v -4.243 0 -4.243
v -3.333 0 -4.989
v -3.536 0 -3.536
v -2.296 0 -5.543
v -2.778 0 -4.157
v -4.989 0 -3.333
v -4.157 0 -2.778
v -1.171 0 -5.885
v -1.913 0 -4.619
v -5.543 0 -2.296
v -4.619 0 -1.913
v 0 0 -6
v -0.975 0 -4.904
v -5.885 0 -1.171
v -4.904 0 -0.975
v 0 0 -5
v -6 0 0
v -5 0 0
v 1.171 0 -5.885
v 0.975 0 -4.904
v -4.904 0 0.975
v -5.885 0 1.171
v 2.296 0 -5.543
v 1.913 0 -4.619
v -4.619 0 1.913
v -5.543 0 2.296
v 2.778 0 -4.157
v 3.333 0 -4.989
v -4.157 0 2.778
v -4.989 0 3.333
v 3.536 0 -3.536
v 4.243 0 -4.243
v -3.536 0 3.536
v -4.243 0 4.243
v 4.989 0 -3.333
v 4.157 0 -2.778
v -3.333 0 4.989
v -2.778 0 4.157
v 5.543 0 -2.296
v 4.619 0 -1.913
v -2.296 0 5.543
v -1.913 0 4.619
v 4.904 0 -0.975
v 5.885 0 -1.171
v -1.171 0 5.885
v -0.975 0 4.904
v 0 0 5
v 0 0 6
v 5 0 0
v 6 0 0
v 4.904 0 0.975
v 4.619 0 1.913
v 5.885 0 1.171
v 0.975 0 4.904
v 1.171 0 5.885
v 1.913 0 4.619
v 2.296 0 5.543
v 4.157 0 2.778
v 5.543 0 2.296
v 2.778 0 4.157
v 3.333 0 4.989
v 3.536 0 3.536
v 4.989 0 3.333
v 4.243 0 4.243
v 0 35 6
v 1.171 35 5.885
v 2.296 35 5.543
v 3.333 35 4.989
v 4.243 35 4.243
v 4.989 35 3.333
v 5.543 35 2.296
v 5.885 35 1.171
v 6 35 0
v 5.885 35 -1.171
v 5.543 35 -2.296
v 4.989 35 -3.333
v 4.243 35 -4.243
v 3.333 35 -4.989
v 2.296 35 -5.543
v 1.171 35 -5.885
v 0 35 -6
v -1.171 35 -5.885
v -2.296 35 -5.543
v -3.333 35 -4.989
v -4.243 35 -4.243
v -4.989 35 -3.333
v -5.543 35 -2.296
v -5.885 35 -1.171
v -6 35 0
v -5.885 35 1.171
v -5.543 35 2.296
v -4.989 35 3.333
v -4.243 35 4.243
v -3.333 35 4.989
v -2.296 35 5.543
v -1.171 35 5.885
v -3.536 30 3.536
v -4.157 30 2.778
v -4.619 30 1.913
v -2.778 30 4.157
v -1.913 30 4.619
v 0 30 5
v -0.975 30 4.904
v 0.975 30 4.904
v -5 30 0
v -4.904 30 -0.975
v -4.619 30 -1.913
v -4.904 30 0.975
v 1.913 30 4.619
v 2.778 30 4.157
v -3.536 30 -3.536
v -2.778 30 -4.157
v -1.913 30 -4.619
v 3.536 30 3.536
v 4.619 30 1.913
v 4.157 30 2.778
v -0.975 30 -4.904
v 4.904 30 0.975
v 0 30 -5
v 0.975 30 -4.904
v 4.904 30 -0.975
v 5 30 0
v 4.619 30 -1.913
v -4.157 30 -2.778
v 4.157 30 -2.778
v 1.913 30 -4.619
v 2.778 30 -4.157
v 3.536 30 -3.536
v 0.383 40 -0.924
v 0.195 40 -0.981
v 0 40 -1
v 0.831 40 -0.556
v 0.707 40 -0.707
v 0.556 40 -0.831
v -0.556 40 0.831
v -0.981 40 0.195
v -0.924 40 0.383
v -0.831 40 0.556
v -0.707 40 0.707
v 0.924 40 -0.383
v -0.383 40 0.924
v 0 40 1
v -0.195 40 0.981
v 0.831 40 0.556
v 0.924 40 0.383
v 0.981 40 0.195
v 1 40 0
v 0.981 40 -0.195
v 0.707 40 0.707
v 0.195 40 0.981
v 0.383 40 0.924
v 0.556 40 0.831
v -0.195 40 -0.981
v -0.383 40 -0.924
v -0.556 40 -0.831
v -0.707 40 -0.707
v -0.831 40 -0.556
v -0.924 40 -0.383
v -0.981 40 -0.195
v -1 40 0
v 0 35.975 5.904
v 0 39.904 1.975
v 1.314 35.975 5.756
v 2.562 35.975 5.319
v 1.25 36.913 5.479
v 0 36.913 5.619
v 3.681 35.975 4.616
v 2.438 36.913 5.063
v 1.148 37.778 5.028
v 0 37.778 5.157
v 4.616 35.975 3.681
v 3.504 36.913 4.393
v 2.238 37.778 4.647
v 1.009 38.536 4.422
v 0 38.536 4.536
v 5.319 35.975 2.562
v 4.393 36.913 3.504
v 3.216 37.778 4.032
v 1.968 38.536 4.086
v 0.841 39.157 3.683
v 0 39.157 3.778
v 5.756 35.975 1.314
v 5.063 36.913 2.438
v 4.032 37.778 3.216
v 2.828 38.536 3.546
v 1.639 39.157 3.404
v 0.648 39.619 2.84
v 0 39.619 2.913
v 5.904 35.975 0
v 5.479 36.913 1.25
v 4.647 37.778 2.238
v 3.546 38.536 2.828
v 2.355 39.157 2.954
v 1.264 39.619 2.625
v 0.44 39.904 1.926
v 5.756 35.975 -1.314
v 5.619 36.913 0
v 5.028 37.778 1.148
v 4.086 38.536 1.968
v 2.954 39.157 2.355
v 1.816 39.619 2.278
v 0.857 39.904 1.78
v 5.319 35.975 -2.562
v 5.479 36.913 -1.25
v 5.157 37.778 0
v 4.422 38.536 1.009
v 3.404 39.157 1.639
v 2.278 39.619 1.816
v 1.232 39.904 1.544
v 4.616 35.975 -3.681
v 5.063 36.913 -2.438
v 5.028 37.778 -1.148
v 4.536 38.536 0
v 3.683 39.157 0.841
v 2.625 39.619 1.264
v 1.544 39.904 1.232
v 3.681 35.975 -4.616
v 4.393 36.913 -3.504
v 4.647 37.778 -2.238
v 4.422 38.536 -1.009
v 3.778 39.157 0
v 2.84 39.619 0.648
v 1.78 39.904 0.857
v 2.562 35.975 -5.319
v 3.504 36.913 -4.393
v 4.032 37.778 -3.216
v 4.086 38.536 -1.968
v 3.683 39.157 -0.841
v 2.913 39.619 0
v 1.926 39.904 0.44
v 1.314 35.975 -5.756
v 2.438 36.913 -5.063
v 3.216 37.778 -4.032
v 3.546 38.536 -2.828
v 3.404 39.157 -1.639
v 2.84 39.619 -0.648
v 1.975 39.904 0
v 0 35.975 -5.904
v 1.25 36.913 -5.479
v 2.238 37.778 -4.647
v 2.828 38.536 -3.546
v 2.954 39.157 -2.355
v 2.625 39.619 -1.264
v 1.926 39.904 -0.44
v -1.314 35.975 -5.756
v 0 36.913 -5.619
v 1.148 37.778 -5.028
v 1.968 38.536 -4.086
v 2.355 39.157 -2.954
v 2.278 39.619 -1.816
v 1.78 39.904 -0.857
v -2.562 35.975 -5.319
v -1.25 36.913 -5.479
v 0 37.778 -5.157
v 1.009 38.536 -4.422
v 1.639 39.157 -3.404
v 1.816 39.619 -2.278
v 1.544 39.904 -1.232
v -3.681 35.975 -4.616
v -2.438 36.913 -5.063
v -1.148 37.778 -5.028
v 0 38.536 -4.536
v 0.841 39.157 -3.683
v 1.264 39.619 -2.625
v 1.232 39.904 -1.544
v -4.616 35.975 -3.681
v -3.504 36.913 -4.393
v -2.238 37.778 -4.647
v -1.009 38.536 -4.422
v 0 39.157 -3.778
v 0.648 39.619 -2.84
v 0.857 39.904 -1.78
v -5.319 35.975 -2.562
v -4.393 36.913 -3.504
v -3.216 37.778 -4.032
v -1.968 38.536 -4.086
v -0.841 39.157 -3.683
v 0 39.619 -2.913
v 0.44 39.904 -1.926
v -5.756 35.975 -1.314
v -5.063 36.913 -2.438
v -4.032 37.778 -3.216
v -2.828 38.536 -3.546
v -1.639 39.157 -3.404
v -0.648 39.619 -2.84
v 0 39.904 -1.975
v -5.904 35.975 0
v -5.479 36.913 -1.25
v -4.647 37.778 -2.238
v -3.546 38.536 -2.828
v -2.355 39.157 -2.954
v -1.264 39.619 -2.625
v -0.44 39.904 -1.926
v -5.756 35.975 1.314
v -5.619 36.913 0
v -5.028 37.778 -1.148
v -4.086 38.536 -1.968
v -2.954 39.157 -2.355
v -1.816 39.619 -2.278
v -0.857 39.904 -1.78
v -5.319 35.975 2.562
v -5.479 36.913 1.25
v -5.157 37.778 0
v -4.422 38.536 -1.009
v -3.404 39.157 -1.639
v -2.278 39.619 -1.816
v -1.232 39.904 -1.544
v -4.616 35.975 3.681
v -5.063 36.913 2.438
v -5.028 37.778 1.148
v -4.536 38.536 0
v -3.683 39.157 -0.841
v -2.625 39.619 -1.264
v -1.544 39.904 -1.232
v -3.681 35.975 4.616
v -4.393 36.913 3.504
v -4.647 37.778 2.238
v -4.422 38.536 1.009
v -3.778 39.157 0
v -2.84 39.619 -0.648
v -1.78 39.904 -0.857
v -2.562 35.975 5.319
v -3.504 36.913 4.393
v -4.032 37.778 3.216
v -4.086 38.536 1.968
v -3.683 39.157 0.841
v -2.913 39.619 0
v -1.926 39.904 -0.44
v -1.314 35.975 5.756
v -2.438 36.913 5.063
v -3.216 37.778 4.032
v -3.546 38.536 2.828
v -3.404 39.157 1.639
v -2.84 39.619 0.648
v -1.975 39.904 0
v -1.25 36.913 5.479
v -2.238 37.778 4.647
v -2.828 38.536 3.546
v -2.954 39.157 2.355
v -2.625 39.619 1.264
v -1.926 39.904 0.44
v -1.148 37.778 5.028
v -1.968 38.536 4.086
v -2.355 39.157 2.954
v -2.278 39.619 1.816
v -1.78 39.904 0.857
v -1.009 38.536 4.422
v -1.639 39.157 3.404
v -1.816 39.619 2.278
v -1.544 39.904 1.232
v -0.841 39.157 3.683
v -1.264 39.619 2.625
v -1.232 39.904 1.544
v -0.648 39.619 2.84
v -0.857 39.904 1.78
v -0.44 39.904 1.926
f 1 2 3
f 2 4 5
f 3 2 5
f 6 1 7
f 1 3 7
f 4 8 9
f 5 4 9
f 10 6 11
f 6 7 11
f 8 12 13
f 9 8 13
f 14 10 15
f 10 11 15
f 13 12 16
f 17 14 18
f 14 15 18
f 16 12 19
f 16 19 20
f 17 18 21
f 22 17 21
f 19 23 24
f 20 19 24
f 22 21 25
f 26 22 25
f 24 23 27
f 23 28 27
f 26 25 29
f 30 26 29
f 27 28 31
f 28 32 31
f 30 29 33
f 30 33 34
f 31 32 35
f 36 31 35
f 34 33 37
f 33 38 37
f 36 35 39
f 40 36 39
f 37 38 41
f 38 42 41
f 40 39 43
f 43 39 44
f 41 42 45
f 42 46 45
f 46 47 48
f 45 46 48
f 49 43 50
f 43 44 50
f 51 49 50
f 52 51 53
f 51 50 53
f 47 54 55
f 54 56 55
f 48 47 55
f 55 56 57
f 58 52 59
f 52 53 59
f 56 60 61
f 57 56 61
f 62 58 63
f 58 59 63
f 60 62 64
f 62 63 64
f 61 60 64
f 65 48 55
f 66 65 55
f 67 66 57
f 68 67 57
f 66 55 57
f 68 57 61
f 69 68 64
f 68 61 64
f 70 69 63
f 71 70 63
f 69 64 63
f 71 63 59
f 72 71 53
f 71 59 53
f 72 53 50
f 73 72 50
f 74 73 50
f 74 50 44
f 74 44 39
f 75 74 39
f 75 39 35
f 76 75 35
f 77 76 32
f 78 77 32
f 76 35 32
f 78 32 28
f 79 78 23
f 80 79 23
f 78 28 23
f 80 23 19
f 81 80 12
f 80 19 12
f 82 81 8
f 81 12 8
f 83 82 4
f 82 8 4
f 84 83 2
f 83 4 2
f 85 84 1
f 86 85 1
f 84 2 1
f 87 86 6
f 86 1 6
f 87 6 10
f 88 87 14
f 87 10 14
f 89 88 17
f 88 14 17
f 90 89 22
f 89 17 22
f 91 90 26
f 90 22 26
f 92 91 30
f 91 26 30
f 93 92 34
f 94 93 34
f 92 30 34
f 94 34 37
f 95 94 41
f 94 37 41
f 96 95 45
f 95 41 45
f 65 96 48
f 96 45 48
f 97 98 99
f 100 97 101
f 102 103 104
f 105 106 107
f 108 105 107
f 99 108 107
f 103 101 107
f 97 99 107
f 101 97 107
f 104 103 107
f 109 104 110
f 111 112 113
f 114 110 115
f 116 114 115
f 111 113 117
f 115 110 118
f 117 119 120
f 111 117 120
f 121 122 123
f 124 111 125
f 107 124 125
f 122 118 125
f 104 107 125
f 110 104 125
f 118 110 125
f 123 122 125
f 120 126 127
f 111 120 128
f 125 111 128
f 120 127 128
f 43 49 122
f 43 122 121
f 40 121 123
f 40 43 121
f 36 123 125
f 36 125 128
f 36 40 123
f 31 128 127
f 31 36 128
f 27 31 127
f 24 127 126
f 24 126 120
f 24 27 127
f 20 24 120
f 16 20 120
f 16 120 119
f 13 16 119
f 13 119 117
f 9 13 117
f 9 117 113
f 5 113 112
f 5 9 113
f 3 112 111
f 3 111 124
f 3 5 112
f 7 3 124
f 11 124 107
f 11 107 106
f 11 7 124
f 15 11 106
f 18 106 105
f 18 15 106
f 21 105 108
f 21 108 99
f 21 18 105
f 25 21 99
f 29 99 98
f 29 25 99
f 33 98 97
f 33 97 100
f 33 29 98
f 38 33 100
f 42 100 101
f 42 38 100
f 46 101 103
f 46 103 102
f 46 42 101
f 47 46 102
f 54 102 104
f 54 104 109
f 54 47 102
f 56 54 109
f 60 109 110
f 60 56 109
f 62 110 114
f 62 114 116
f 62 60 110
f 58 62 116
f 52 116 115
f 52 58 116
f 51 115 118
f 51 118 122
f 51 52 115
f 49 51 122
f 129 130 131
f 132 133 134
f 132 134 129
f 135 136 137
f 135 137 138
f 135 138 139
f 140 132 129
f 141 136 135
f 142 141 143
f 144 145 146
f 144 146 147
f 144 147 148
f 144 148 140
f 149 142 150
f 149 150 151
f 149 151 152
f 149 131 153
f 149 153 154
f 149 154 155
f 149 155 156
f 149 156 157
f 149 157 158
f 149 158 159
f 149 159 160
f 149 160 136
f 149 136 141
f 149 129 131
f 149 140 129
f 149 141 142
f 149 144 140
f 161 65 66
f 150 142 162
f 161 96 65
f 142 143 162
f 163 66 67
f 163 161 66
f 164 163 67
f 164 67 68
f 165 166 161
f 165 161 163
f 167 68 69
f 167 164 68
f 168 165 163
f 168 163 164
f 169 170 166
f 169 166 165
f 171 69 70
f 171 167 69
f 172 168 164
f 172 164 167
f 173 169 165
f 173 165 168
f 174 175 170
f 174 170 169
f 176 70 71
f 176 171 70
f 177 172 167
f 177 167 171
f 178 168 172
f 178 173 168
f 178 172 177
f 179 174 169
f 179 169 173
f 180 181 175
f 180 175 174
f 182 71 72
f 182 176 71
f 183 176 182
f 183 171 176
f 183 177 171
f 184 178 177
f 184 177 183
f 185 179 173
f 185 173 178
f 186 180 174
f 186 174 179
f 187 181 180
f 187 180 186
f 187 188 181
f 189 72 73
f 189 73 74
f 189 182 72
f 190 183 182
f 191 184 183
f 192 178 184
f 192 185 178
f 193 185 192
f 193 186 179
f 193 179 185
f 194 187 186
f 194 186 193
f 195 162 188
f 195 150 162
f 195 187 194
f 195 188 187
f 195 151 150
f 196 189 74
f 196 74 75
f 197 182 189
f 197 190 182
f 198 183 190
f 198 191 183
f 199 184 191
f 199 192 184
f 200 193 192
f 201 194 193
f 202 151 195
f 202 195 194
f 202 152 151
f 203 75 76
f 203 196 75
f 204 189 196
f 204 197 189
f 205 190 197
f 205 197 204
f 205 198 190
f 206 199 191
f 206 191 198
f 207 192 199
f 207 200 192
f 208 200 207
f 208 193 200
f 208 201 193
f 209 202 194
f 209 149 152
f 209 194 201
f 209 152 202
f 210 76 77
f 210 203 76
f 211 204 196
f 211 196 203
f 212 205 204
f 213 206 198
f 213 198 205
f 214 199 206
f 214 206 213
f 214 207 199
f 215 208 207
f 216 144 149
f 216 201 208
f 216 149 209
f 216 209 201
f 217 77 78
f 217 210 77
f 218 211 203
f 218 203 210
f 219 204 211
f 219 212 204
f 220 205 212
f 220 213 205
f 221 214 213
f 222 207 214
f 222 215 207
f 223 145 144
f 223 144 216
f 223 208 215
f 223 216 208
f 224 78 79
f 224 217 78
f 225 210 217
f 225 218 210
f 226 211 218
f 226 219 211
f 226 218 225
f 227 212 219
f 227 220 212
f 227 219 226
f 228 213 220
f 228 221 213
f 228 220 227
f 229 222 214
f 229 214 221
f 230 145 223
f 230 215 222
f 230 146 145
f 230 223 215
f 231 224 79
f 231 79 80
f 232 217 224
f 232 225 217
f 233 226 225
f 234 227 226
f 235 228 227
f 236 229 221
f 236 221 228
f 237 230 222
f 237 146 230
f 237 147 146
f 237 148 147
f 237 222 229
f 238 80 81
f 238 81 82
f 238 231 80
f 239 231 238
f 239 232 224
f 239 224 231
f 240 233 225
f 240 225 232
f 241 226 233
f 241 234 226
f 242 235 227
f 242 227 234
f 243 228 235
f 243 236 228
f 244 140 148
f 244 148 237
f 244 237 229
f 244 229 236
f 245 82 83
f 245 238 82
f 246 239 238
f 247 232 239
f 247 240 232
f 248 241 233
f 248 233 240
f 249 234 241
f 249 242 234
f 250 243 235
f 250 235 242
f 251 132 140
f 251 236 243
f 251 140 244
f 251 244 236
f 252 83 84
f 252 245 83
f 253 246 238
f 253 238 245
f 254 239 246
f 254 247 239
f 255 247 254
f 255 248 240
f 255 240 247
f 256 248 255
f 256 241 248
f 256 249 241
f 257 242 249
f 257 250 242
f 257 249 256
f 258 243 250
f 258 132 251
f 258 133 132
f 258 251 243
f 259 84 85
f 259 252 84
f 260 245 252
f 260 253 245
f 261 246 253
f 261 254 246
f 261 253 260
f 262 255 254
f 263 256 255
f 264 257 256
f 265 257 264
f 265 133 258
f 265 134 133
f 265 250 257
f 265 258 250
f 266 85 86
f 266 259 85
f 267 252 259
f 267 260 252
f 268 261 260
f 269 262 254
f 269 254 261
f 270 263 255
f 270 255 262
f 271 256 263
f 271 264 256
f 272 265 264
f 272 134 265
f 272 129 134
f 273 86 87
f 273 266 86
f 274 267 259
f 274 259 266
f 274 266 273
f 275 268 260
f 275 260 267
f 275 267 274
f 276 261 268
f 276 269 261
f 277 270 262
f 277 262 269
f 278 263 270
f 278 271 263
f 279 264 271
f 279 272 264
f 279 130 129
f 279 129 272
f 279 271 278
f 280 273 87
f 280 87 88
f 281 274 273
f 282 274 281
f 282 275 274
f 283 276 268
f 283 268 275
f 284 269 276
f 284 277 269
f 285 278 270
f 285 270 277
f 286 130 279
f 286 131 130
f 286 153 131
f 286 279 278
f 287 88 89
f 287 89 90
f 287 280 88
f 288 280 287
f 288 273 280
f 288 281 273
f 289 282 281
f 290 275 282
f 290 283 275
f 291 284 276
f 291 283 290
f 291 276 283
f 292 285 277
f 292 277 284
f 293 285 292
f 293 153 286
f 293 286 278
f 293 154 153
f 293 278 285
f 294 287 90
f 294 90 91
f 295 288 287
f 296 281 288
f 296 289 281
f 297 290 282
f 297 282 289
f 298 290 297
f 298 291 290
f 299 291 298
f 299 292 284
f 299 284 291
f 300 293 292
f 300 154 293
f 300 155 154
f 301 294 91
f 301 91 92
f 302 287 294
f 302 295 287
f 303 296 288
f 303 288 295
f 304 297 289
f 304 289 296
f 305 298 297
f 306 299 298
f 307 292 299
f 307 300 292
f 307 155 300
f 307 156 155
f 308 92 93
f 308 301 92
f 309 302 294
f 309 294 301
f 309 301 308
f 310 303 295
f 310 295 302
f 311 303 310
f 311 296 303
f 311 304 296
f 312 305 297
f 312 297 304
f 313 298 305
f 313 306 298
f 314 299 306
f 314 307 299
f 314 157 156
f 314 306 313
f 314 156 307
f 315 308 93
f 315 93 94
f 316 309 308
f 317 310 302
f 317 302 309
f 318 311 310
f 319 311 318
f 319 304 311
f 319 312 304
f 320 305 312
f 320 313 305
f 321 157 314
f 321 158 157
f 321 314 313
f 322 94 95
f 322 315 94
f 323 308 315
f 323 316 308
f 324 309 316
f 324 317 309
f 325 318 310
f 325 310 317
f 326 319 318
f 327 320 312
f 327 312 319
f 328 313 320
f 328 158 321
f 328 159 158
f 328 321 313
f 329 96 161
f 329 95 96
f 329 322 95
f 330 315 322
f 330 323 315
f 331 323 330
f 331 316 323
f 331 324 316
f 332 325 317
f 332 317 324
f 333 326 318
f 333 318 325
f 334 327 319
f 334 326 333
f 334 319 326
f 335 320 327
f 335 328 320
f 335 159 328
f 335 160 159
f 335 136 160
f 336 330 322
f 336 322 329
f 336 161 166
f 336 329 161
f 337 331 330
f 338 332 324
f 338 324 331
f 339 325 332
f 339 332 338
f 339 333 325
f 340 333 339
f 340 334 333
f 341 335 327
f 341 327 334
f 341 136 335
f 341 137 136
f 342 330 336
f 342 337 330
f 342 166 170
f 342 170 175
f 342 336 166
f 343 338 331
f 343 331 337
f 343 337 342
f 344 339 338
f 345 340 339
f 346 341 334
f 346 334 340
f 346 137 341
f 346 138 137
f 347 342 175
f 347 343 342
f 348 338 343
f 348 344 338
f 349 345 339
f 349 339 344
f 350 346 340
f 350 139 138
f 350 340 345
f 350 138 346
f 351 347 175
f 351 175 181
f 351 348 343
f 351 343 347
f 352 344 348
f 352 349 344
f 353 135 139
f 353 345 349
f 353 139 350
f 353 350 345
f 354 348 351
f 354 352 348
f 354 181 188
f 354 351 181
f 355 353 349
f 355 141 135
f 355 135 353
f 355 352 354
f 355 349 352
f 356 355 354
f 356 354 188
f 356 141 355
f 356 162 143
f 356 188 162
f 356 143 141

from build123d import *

# Parameters (mm, degrees)
SKETCH1_R           = 6
BOSS_EXTRUDE1_DEPTH = 40
FILLET2_R           = 5
SHELL1_OUTLINE_R    = 5
SHELL1_DEPTH        = 30


# Read off the part's stored shape, not the designer's step: Shell1
with BuildPart() as part:
    # Sketch1 → Boss-Extrude1 (new body)
    with BuildSketch(Plane(origin=(0, 0, 0), x_dir=(1, 0, 0), z_dir=(0, 1, 0))):
        with Locations(Location((0, 0, 0), (0, 0, 270))):
            Circle(SKETCH1_R)
    extrude(amount=BOSS_EXTRUDE1_DEPTH)

    # Fillet2
    fillet2_edges = [part.edges().sort_by_distance(p)[0] for p in [
        (0, 40, -6),
    ]]
    fillet(fillet2_edges, radius=FILLET2_R)

    # Shell1 outline → Shell1 (cut)
    with BuildSketch(Plane(origin=(0, 0, 0), x_dir=(1, 0, 0), z_dir=(0, 1, 0))):
        Circle(SHELL1_OUTLINE_R)
    extrude(amount=SHELL1_DEPTH, mode=Mode.SUBTRACT)


solid = part.part
